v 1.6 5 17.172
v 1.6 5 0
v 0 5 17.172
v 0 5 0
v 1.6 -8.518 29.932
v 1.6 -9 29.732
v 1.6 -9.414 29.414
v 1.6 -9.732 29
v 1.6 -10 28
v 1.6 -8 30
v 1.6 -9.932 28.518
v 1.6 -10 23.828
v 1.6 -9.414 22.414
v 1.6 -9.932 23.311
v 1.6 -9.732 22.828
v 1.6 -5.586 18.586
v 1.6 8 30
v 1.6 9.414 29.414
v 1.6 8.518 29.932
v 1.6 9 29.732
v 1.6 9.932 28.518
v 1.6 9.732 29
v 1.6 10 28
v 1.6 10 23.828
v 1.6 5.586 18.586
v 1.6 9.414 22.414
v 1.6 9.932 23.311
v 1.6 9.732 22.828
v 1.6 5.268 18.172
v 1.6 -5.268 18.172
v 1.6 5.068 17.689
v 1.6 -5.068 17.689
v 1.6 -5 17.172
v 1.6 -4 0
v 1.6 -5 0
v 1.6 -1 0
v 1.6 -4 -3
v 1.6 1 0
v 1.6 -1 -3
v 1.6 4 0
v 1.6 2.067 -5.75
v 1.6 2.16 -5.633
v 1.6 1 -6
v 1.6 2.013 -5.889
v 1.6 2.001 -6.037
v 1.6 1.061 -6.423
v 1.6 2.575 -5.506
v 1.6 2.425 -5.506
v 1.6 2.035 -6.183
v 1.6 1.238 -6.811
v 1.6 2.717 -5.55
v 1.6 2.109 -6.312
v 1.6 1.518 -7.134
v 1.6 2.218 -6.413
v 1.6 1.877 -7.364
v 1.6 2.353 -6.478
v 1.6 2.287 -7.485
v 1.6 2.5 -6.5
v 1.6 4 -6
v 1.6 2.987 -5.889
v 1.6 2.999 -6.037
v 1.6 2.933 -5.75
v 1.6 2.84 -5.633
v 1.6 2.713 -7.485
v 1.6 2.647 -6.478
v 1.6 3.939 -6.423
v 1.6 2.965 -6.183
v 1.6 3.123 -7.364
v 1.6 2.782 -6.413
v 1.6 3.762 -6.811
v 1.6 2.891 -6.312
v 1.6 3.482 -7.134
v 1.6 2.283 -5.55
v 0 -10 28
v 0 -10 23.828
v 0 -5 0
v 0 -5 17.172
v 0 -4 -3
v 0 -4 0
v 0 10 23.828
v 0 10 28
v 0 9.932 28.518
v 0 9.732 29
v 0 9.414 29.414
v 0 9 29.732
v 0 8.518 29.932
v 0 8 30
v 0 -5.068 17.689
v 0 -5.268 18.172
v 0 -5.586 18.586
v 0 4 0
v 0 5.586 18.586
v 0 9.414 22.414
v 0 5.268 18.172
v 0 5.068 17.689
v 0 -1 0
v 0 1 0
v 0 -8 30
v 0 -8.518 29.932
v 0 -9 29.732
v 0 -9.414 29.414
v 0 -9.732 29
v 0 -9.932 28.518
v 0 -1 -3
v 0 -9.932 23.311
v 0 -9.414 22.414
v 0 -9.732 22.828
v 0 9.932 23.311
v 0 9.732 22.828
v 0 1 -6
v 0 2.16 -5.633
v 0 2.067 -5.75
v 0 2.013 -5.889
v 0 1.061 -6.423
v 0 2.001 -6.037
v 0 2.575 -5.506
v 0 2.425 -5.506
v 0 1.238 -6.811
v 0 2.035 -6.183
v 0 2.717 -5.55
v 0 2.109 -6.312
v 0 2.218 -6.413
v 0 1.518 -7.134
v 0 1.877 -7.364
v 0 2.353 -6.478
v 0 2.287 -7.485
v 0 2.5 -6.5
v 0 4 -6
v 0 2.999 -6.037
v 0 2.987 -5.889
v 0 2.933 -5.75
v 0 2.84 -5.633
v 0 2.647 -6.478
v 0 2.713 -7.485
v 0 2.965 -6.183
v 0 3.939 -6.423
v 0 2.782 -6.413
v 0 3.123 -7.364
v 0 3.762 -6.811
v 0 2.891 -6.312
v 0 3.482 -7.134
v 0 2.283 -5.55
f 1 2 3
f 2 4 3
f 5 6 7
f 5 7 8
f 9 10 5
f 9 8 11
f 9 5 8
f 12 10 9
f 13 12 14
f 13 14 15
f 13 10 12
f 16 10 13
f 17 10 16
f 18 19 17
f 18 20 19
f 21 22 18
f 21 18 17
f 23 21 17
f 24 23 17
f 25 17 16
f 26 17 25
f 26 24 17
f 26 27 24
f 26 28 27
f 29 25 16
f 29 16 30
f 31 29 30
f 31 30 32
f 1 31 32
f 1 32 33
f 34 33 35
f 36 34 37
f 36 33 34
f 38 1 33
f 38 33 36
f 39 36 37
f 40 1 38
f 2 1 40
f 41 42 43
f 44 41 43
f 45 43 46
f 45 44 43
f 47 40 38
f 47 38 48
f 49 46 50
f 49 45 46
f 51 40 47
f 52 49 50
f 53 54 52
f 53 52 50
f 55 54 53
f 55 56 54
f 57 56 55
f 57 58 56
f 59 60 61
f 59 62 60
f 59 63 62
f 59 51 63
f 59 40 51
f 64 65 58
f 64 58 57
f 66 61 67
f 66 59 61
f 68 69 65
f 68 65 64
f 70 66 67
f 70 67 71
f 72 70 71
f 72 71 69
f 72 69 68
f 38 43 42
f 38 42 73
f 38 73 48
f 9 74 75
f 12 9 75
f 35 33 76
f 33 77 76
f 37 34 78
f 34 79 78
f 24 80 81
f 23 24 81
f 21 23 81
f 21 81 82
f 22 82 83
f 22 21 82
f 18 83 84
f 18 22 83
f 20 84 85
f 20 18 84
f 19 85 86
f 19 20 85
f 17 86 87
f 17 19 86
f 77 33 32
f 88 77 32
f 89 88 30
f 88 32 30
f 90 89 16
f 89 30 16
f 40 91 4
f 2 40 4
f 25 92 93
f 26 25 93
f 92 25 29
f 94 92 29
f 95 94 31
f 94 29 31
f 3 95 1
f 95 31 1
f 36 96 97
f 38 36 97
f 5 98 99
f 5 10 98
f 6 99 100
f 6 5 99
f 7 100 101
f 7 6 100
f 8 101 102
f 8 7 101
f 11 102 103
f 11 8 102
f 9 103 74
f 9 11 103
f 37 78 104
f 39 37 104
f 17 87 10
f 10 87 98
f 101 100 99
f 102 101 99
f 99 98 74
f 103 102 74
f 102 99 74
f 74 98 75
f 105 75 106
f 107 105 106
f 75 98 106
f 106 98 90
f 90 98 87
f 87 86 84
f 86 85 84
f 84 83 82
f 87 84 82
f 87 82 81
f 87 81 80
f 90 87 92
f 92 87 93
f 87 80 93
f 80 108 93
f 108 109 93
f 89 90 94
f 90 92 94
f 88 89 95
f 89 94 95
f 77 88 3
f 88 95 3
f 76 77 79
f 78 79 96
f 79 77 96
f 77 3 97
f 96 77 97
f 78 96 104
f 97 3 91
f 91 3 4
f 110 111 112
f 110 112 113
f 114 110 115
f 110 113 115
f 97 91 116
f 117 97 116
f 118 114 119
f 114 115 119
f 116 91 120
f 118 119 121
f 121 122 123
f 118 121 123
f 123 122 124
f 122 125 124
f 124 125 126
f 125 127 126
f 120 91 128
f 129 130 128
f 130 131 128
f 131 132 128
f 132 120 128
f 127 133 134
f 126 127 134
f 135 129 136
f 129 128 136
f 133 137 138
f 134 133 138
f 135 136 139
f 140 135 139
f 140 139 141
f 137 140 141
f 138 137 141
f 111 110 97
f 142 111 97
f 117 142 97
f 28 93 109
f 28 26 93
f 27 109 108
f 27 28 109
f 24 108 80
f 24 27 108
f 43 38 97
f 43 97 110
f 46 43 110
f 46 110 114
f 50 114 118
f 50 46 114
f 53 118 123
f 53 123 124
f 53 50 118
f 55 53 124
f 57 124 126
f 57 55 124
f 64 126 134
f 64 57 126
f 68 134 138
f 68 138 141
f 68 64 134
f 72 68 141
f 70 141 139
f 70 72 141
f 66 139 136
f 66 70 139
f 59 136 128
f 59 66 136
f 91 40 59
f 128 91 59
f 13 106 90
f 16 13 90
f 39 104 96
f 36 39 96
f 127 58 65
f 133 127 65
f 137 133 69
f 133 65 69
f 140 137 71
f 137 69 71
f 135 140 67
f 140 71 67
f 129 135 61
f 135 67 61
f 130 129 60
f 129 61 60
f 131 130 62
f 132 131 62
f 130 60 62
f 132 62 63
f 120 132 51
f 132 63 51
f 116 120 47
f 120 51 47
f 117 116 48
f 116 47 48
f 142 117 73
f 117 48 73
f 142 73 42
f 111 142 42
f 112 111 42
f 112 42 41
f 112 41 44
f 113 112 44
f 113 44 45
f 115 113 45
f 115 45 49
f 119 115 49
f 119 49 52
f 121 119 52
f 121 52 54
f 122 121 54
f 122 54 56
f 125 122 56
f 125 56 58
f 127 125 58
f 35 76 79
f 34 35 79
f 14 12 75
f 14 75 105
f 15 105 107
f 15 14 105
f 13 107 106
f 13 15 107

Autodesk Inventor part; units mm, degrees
ref_plane "YZ Plane" through (0, 0, 0) normal (1, 0, 0) x (0, 1, 0)
ref_plane "XZ Plane" through (0, 0, 0) normal (0, 1, 0) x (-1, 0, 0)
ref_plane "XY Plane" through (0, 0, 0) normal (0, 0, 1) x (1, 0, 0)
sketch "Sketch1" plane through (0, 0, 0) normal (1, 0, 0) x (0, 1, 0)
  line L0 (0, 0) -> (1, 0)
  line L1 (1, 0) -> (1, -3)
  line L2 (1, -3) -> (4, -3)
  line L3 (4, -3) -> (4, 0)
  line L4 (4, 0) -> (5, 0)
  line L5 (5, 0) -> (5, 18)
  line L6 (5, 18) -> (10, 23)
  line L7 (10, 23) -> (10, 30)
  line L8 (10, 30) -> (0, 30)
  line L9 (0, 30) -> (0, 0)
  dimension "d0" = 1
  dimension "d1" = 3
  dimension "d2" = 1
  dimension "d3" = 3
  dimension "d4" = 30
  dimension "d5" = 7
  dimension "d6" = 45
  dimension "d7" = 10
extrude "Extrusion1" add sketch "Sketch1" along normal blind 1.6
mirror "Mirror1" about plane through (0, 0, 30) normal (0, -1, 0) of "Extrusion1"
fillet "Fillet1" radius 2 6 edges at (0.8, 10, 30) (0.8, 10, 23) (0.8, -10, 30) (0.8, -10, 23) (0.8, -5, 18) (0.8, 5, 18)
sketch "Sketch2" plane through (1.6, 0, 0) normal (1, 0, 0) x (0, 0, -1)
  line L0 (0, 1) -> (3, 1) projected
  line L1 (3, 1) -> (3, 4) projected
  arc A0 (6, 1) -> (6, 4) centre (6, 2.5) ccw
  line L2 (3, 4) -> (6, 4)
  line L3 (3, 1) -> (6, 1)
  circle A1 centre (6, 2.5) radius 0.5
  point P0 (0, 0)
  dimension "d11" = 3
  dimension "d12" = 3
  dimension "d13" = 1
extrude "Extrusion2" add sketch "Sketch2" against normal up to surface (1.6 mm away)
sketch "Sketch3" plane through (1.6, 0, 0) normal (1, 0, 0) x (0, 0, -1)
  line L0 (-30, 10) -> (7.5, 10) construction
  line L1 (7.5, 10) -> (7.5, -9.9928) construction
  line L2 (7.5, -9.9928) -> (-30, -9.9928) construction
  line L3 (-30, -9.9928) -> (-30, 10) construction
  line L4 (-23.8284, 10) -> (-28, 10) projected
  line L5 (-30, 8) -> (-30, -8) projected
  arc A0 (6, 1) -> (6, 4) centre (6, 2.5) ccw projected
  point P0 (0, 0)
  dimension "d17" = 1.5
  dimension "d18" = 1.5
decal "Decal1"
sketch "Sketch4" plane through (0, 0, 0) normal (-1, 0, 0) x (0, 0, 1)
  line L0 (-7.5, 10) -> (30, 10) construction
  line L1 (30, 10) -> (30, -9.9928) construction
  line L2 (30, -9.9928) -> (-7.5, -9.9928) construction
  line L3 (-7.5, -9.9928) -> (-7.5, 10) construction
  line L4 (30, 8) -> (30, -8) projected
  line L5 (23.8284, 10) -> (28, 10) projected
  arc A0 (-6, 4) -> (-6, 1) centre (-6, 2.5) ccw projected
  point P0 (0, 0)
  dimension "d20" = 1.5
decal "Decal2"
equation "\"d17\" = d18"
equation "\"d20\" = d18"
properties part number "KeyerPaddle"
